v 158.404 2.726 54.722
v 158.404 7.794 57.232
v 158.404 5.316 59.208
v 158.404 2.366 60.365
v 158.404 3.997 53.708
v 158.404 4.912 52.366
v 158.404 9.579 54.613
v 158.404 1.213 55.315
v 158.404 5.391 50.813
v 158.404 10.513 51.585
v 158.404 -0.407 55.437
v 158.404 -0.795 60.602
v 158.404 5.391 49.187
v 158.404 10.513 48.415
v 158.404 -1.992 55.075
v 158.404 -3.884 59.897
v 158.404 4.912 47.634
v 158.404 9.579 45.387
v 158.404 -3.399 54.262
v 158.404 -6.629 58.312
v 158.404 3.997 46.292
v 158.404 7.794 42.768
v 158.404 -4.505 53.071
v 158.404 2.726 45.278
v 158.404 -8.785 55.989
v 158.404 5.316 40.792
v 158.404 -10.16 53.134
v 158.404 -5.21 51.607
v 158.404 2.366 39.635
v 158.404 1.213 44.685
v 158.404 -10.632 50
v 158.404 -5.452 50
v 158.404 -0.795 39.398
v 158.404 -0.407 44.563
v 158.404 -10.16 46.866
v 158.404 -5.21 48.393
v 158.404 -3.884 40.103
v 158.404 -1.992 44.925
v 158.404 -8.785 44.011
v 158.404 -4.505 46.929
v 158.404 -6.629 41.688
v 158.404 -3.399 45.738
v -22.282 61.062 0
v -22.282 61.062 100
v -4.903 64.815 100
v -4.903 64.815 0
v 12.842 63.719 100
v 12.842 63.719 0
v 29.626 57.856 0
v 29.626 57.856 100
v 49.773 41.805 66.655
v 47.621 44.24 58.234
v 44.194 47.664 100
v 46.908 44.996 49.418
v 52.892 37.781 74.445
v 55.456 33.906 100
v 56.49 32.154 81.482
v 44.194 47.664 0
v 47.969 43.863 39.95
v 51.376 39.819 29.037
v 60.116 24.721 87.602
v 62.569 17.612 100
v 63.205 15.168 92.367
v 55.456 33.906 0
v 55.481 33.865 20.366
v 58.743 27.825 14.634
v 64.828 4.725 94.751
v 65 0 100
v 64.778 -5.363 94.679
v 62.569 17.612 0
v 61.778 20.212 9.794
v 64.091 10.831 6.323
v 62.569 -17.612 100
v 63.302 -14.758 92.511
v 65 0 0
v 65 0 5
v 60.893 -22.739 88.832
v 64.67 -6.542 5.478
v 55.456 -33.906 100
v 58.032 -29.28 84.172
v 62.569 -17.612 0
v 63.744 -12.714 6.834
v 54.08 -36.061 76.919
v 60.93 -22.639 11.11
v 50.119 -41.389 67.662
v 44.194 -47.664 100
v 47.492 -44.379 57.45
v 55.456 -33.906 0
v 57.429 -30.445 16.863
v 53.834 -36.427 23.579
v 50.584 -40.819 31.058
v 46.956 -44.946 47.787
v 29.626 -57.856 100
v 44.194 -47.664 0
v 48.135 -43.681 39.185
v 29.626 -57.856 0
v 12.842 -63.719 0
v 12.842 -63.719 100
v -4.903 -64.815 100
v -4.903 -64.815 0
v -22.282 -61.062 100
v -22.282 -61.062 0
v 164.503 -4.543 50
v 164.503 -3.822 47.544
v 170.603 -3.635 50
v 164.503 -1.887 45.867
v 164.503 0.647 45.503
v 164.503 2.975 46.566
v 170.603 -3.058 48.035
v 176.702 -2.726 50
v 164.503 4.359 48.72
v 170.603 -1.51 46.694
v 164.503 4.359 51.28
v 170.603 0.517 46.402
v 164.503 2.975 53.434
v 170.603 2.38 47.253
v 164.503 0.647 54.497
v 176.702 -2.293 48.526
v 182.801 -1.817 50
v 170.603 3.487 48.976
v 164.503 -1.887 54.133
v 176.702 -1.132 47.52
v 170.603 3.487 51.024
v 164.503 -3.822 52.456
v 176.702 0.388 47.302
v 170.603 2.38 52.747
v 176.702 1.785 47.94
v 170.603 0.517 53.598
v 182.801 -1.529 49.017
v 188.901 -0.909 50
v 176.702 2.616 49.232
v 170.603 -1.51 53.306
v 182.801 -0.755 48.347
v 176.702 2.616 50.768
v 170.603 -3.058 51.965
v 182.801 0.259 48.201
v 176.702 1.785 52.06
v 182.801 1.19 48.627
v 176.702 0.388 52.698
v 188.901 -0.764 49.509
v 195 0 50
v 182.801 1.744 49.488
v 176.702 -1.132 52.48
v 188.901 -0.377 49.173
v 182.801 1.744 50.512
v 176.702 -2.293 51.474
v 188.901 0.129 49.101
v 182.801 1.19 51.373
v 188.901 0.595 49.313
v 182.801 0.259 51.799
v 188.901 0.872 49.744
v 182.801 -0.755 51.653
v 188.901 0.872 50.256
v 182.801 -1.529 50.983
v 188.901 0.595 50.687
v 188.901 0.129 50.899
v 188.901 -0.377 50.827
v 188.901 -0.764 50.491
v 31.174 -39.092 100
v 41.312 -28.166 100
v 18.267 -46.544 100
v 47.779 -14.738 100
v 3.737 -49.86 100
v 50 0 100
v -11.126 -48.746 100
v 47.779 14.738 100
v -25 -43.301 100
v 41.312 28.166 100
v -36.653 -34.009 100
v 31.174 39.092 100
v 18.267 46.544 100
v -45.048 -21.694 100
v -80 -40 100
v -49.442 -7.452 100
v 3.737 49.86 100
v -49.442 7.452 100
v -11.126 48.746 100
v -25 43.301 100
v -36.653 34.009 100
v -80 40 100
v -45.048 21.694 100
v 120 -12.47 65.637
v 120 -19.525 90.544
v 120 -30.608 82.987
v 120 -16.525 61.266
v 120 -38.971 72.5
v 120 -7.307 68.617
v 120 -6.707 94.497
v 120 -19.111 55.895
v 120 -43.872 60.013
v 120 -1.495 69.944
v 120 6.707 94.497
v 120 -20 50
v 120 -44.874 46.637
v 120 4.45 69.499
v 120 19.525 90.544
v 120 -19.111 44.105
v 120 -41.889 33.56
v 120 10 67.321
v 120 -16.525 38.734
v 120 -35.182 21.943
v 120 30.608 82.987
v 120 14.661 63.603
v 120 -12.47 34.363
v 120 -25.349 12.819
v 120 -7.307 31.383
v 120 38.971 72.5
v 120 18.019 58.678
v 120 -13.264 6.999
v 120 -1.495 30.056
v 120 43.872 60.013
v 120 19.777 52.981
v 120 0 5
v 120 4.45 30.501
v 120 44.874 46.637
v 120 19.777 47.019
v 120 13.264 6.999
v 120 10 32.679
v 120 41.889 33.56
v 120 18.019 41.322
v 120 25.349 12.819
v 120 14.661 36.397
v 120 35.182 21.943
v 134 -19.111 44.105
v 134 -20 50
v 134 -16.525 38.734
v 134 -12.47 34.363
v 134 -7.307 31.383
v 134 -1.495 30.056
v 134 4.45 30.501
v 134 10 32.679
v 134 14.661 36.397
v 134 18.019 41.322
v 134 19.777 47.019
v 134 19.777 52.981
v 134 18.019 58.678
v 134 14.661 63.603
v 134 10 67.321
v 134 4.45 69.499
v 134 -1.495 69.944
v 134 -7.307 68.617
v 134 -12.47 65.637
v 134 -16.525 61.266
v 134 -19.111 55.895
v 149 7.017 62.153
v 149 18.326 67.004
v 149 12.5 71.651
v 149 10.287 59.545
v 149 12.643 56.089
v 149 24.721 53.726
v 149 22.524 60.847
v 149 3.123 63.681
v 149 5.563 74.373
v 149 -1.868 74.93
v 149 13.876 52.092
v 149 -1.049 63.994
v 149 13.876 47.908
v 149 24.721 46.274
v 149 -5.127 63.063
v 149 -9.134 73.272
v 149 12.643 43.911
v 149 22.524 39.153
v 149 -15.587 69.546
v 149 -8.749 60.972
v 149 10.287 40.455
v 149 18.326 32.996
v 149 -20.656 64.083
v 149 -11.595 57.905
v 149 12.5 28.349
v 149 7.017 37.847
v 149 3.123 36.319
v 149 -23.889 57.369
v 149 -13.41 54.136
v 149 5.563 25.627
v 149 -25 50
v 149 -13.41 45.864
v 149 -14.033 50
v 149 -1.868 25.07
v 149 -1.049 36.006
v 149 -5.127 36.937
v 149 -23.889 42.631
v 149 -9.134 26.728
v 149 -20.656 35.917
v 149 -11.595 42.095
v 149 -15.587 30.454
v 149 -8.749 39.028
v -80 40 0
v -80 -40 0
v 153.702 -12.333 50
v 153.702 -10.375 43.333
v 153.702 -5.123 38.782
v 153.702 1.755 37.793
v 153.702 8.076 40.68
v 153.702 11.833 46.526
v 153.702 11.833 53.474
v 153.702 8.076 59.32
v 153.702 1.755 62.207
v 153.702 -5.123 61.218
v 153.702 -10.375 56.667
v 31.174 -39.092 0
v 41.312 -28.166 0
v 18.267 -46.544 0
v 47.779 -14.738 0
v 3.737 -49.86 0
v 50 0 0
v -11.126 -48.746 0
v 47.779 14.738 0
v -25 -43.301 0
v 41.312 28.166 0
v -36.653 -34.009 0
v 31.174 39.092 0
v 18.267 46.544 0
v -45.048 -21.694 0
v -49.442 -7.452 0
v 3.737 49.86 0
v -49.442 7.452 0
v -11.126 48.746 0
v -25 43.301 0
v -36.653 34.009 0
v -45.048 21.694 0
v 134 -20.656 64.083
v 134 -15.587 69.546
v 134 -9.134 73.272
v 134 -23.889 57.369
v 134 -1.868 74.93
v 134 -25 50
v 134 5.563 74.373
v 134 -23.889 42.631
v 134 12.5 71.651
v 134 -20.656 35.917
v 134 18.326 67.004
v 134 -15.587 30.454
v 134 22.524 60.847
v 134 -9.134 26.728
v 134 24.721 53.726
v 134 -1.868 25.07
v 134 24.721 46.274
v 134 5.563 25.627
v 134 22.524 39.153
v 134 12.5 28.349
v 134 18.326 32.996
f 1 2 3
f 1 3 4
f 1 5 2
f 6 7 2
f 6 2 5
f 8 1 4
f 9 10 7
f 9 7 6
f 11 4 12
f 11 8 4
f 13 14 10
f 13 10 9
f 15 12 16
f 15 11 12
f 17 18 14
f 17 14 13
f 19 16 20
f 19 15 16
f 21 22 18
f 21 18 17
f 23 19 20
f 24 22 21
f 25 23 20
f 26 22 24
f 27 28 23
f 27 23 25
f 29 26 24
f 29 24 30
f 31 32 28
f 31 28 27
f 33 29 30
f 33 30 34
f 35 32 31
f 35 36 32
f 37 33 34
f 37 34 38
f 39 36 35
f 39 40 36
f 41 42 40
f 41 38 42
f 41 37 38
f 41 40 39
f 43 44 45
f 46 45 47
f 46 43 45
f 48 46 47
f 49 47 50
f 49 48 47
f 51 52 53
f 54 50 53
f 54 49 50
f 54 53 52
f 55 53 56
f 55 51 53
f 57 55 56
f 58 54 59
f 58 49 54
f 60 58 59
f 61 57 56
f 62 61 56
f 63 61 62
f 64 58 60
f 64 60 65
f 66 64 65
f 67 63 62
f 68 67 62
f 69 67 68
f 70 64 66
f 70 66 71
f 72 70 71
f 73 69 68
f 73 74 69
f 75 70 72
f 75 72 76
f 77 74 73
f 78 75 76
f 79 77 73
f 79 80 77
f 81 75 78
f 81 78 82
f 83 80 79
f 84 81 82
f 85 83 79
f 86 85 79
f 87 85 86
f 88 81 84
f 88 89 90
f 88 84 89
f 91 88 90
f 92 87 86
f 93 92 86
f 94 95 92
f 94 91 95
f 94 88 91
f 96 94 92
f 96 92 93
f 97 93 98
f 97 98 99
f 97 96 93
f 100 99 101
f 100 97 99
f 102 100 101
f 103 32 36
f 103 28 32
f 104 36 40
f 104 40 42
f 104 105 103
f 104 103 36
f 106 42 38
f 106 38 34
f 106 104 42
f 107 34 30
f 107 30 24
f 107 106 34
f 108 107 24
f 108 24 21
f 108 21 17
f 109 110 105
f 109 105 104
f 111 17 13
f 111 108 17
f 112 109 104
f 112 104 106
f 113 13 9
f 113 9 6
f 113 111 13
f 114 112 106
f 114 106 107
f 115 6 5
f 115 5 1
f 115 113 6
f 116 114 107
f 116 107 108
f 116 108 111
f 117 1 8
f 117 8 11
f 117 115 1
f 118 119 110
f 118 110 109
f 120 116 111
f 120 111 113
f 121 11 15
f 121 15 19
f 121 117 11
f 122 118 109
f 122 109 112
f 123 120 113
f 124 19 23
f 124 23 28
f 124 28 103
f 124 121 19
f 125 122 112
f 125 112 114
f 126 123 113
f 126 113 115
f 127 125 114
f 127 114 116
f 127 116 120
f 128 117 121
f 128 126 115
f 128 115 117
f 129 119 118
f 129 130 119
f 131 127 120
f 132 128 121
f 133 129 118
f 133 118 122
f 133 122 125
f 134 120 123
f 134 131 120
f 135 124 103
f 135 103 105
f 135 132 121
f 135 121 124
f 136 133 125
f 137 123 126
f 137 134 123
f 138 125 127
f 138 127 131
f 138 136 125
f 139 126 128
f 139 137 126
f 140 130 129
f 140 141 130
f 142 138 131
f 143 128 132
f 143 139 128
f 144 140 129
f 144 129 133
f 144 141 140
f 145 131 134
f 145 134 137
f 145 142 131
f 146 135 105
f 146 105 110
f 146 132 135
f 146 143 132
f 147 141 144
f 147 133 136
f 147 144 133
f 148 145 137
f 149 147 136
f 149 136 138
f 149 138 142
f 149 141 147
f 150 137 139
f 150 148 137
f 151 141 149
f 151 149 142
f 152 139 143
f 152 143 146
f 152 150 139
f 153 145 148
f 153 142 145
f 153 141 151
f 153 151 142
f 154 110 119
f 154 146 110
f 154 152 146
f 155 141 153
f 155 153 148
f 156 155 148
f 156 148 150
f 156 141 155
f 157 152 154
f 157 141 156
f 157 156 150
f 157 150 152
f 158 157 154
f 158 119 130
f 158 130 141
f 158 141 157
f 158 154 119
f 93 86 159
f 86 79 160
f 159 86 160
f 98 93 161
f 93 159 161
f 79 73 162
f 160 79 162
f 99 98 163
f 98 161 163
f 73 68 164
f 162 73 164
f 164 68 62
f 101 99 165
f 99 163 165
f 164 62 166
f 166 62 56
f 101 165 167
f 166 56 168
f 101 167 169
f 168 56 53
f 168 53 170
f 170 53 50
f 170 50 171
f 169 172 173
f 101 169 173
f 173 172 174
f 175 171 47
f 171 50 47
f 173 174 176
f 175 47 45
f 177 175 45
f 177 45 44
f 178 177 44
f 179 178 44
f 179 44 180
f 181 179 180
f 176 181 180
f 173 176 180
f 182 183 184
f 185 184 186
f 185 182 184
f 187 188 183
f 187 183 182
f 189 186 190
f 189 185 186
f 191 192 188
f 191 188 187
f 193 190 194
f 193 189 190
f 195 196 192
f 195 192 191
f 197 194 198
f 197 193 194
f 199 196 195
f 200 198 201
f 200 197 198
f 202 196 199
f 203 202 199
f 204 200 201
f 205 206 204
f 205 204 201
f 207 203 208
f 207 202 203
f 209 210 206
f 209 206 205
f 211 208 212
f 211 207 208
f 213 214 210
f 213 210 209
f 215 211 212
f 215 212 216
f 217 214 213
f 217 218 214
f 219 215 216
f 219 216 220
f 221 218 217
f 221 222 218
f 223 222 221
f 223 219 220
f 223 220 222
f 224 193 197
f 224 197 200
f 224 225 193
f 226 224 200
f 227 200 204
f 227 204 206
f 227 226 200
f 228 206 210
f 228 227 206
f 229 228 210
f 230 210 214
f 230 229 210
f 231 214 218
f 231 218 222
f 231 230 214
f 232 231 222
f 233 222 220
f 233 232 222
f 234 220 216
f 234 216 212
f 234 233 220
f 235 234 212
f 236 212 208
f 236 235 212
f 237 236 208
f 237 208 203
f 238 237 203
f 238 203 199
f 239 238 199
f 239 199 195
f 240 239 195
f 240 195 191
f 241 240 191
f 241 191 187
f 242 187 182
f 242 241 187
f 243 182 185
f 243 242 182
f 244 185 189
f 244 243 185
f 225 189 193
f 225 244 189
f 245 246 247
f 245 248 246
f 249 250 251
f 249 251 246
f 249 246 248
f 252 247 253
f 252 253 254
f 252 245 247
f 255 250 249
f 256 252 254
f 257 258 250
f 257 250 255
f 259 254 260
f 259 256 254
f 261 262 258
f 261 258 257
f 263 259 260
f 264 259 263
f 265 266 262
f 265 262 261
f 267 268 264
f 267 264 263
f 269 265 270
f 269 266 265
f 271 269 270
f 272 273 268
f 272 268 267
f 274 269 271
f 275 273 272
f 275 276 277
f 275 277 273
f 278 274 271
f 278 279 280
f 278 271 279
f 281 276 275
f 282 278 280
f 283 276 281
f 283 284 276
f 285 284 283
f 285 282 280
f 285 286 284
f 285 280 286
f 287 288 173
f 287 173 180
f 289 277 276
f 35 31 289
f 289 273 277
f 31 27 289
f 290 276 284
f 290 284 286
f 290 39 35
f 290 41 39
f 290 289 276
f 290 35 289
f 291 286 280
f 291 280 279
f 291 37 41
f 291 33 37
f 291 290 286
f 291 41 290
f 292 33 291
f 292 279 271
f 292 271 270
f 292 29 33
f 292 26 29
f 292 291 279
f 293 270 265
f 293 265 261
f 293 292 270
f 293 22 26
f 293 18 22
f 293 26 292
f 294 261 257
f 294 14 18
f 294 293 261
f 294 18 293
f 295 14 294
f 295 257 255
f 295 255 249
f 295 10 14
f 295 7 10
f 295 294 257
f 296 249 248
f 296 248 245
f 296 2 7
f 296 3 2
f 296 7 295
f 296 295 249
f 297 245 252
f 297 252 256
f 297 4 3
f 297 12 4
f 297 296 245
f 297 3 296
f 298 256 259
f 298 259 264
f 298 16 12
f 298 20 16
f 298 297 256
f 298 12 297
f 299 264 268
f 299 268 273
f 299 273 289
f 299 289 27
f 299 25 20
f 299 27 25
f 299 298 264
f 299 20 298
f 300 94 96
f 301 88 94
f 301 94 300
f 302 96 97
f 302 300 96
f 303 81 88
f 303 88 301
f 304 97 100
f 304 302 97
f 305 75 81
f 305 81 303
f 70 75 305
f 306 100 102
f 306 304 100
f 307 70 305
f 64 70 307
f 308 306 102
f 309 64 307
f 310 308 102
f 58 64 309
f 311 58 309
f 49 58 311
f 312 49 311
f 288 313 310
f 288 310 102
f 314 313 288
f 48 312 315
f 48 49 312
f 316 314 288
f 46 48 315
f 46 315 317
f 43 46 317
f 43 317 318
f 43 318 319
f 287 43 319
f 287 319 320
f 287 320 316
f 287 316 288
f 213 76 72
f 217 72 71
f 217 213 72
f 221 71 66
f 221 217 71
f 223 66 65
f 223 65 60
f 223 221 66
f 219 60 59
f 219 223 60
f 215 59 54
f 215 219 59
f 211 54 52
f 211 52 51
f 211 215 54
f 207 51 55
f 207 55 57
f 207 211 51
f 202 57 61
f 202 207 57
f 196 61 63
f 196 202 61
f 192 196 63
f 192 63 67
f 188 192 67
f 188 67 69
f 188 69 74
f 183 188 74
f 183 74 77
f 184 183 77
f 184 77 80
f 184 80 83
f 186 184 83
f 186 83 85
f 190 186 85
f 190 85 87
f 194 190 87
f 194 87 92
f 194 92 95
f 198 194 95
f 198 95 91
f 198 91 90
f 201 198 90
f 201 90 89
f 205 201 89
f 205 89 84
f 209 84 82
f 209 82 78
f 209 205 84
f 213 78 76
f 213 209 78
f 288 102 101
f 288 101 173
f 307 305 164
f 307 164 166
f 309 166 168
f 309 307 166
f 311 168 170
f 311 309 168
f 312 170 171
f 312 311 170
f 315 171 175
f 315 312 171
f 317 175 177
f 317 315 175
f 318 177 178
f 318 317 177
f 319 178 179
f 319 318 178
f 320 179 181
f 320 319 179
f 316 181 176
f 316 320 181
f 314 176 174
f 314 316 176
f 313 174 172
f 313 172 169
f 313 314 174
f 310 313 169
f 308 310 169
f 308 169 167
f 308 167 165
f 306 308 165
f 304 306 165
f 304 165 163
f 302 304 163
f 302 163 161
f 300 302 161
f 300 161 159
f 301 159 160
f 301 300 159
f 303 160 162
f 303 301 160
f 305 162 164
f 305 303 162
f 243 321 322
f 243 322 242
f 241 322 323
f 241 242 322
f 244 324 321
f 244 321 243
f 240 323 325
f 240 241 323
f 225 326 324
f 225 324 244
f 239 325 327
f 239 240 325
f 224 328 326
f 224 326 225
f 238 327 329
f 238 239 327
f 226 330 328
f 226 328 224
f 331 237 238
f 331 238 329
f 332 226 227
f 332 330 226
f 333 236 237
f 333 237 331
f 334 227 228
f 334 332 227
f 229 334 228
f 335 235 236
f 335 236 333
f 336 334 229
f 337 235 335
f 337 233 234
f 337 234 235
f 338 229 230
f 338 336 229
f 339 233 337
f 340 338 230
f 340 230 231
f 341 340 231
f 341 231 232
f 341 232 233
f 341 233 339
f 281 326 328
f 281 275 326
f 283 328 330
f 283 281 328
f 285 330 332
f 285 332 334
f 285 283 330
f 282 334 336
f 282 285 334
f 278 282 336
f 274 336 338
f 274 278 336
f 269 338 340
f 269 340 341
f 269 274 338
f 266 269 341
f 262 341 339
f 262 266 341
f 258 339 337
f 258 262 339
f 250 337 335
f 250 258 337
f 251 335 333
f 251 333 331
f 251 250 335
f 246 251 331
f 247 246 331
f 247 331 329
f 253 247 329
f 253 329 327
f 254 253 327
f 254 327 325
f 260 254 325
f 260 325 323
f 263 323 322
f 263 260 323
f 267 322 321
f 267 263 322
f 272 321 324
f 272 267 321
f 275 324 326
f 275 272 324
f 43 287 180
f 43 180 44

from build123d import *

# Parameters (mm, degrees)
IZIM1_R                     = 50
Y_KSEKLIK_EKSTR_ZYON1_DEPTH = 100
Y_KSEKLIK_EKSTR_ZYON2_REACH = 202
IZIM3_R                     = 45


with BuildPart() as part:
    # Çizim1 → Yükseklik-Ekstrüzyon1 (new body)
    with BuildSketch(Plane.XY):
        with BuildLine():
            Line((-80, -40), (-80, 40))
            Line((-80, 40), (-22.281665693, 61.061668614))
            ThreePointArc((-22.281665693, 61.061668614), (65, 0), (-22.281665693, -61.061668614))
            Line((-22.281665693, -61.061668614), (-80, -40))
        make_face()
        Circle(IZIM1_R, mode=Mode.SUBTRACT)
    extrude(amount=Y_KSEKLIK_EKSTR_ZYON1_DEPTH)

    # Çizim3 → Yükseklik-Ekstrüzyon2 (add, up to next)
    with BuildSketch(Plane(origin=(120, 0, 0), x_dir=(0, 0, -1), z_dir=(1, 0, 0)), mode=Mode.PRIVATE) as y_kseklik_ekstr_zyon2_sk1:
        with Locations((-50, 0)):
            Circle(IZIM3_R)
    y_kseklik_ekstr_zyon2_tool1 = extrude(y_kseklik_ekstr_zyon2_sk1.sketch, amount=-Y_KSEKLIK_EKSTR_ZYON2_REACH, mode=Mode.PRIVATE) - part.part
    add(y_kseklik_ekstr_zyon2_tool1.solids().sort_by_distance((120, 0, 50))[0])

    # Çizim6 → Döndür1 (revolve)
    with BuildSketch(Plane.XY.offset(50)):
        Polygon((120, 0), (120, -20), (134, -20), (134, -25), (149, -25), (149, -14.033097), (158.403875038, -10.632048004), (158.403875038, -5.4519389), (195, 0), align=None)
    revolve(axis=Axis((-133.942981773, 0, 50), (1, 0, 0)))


solid = part.part
